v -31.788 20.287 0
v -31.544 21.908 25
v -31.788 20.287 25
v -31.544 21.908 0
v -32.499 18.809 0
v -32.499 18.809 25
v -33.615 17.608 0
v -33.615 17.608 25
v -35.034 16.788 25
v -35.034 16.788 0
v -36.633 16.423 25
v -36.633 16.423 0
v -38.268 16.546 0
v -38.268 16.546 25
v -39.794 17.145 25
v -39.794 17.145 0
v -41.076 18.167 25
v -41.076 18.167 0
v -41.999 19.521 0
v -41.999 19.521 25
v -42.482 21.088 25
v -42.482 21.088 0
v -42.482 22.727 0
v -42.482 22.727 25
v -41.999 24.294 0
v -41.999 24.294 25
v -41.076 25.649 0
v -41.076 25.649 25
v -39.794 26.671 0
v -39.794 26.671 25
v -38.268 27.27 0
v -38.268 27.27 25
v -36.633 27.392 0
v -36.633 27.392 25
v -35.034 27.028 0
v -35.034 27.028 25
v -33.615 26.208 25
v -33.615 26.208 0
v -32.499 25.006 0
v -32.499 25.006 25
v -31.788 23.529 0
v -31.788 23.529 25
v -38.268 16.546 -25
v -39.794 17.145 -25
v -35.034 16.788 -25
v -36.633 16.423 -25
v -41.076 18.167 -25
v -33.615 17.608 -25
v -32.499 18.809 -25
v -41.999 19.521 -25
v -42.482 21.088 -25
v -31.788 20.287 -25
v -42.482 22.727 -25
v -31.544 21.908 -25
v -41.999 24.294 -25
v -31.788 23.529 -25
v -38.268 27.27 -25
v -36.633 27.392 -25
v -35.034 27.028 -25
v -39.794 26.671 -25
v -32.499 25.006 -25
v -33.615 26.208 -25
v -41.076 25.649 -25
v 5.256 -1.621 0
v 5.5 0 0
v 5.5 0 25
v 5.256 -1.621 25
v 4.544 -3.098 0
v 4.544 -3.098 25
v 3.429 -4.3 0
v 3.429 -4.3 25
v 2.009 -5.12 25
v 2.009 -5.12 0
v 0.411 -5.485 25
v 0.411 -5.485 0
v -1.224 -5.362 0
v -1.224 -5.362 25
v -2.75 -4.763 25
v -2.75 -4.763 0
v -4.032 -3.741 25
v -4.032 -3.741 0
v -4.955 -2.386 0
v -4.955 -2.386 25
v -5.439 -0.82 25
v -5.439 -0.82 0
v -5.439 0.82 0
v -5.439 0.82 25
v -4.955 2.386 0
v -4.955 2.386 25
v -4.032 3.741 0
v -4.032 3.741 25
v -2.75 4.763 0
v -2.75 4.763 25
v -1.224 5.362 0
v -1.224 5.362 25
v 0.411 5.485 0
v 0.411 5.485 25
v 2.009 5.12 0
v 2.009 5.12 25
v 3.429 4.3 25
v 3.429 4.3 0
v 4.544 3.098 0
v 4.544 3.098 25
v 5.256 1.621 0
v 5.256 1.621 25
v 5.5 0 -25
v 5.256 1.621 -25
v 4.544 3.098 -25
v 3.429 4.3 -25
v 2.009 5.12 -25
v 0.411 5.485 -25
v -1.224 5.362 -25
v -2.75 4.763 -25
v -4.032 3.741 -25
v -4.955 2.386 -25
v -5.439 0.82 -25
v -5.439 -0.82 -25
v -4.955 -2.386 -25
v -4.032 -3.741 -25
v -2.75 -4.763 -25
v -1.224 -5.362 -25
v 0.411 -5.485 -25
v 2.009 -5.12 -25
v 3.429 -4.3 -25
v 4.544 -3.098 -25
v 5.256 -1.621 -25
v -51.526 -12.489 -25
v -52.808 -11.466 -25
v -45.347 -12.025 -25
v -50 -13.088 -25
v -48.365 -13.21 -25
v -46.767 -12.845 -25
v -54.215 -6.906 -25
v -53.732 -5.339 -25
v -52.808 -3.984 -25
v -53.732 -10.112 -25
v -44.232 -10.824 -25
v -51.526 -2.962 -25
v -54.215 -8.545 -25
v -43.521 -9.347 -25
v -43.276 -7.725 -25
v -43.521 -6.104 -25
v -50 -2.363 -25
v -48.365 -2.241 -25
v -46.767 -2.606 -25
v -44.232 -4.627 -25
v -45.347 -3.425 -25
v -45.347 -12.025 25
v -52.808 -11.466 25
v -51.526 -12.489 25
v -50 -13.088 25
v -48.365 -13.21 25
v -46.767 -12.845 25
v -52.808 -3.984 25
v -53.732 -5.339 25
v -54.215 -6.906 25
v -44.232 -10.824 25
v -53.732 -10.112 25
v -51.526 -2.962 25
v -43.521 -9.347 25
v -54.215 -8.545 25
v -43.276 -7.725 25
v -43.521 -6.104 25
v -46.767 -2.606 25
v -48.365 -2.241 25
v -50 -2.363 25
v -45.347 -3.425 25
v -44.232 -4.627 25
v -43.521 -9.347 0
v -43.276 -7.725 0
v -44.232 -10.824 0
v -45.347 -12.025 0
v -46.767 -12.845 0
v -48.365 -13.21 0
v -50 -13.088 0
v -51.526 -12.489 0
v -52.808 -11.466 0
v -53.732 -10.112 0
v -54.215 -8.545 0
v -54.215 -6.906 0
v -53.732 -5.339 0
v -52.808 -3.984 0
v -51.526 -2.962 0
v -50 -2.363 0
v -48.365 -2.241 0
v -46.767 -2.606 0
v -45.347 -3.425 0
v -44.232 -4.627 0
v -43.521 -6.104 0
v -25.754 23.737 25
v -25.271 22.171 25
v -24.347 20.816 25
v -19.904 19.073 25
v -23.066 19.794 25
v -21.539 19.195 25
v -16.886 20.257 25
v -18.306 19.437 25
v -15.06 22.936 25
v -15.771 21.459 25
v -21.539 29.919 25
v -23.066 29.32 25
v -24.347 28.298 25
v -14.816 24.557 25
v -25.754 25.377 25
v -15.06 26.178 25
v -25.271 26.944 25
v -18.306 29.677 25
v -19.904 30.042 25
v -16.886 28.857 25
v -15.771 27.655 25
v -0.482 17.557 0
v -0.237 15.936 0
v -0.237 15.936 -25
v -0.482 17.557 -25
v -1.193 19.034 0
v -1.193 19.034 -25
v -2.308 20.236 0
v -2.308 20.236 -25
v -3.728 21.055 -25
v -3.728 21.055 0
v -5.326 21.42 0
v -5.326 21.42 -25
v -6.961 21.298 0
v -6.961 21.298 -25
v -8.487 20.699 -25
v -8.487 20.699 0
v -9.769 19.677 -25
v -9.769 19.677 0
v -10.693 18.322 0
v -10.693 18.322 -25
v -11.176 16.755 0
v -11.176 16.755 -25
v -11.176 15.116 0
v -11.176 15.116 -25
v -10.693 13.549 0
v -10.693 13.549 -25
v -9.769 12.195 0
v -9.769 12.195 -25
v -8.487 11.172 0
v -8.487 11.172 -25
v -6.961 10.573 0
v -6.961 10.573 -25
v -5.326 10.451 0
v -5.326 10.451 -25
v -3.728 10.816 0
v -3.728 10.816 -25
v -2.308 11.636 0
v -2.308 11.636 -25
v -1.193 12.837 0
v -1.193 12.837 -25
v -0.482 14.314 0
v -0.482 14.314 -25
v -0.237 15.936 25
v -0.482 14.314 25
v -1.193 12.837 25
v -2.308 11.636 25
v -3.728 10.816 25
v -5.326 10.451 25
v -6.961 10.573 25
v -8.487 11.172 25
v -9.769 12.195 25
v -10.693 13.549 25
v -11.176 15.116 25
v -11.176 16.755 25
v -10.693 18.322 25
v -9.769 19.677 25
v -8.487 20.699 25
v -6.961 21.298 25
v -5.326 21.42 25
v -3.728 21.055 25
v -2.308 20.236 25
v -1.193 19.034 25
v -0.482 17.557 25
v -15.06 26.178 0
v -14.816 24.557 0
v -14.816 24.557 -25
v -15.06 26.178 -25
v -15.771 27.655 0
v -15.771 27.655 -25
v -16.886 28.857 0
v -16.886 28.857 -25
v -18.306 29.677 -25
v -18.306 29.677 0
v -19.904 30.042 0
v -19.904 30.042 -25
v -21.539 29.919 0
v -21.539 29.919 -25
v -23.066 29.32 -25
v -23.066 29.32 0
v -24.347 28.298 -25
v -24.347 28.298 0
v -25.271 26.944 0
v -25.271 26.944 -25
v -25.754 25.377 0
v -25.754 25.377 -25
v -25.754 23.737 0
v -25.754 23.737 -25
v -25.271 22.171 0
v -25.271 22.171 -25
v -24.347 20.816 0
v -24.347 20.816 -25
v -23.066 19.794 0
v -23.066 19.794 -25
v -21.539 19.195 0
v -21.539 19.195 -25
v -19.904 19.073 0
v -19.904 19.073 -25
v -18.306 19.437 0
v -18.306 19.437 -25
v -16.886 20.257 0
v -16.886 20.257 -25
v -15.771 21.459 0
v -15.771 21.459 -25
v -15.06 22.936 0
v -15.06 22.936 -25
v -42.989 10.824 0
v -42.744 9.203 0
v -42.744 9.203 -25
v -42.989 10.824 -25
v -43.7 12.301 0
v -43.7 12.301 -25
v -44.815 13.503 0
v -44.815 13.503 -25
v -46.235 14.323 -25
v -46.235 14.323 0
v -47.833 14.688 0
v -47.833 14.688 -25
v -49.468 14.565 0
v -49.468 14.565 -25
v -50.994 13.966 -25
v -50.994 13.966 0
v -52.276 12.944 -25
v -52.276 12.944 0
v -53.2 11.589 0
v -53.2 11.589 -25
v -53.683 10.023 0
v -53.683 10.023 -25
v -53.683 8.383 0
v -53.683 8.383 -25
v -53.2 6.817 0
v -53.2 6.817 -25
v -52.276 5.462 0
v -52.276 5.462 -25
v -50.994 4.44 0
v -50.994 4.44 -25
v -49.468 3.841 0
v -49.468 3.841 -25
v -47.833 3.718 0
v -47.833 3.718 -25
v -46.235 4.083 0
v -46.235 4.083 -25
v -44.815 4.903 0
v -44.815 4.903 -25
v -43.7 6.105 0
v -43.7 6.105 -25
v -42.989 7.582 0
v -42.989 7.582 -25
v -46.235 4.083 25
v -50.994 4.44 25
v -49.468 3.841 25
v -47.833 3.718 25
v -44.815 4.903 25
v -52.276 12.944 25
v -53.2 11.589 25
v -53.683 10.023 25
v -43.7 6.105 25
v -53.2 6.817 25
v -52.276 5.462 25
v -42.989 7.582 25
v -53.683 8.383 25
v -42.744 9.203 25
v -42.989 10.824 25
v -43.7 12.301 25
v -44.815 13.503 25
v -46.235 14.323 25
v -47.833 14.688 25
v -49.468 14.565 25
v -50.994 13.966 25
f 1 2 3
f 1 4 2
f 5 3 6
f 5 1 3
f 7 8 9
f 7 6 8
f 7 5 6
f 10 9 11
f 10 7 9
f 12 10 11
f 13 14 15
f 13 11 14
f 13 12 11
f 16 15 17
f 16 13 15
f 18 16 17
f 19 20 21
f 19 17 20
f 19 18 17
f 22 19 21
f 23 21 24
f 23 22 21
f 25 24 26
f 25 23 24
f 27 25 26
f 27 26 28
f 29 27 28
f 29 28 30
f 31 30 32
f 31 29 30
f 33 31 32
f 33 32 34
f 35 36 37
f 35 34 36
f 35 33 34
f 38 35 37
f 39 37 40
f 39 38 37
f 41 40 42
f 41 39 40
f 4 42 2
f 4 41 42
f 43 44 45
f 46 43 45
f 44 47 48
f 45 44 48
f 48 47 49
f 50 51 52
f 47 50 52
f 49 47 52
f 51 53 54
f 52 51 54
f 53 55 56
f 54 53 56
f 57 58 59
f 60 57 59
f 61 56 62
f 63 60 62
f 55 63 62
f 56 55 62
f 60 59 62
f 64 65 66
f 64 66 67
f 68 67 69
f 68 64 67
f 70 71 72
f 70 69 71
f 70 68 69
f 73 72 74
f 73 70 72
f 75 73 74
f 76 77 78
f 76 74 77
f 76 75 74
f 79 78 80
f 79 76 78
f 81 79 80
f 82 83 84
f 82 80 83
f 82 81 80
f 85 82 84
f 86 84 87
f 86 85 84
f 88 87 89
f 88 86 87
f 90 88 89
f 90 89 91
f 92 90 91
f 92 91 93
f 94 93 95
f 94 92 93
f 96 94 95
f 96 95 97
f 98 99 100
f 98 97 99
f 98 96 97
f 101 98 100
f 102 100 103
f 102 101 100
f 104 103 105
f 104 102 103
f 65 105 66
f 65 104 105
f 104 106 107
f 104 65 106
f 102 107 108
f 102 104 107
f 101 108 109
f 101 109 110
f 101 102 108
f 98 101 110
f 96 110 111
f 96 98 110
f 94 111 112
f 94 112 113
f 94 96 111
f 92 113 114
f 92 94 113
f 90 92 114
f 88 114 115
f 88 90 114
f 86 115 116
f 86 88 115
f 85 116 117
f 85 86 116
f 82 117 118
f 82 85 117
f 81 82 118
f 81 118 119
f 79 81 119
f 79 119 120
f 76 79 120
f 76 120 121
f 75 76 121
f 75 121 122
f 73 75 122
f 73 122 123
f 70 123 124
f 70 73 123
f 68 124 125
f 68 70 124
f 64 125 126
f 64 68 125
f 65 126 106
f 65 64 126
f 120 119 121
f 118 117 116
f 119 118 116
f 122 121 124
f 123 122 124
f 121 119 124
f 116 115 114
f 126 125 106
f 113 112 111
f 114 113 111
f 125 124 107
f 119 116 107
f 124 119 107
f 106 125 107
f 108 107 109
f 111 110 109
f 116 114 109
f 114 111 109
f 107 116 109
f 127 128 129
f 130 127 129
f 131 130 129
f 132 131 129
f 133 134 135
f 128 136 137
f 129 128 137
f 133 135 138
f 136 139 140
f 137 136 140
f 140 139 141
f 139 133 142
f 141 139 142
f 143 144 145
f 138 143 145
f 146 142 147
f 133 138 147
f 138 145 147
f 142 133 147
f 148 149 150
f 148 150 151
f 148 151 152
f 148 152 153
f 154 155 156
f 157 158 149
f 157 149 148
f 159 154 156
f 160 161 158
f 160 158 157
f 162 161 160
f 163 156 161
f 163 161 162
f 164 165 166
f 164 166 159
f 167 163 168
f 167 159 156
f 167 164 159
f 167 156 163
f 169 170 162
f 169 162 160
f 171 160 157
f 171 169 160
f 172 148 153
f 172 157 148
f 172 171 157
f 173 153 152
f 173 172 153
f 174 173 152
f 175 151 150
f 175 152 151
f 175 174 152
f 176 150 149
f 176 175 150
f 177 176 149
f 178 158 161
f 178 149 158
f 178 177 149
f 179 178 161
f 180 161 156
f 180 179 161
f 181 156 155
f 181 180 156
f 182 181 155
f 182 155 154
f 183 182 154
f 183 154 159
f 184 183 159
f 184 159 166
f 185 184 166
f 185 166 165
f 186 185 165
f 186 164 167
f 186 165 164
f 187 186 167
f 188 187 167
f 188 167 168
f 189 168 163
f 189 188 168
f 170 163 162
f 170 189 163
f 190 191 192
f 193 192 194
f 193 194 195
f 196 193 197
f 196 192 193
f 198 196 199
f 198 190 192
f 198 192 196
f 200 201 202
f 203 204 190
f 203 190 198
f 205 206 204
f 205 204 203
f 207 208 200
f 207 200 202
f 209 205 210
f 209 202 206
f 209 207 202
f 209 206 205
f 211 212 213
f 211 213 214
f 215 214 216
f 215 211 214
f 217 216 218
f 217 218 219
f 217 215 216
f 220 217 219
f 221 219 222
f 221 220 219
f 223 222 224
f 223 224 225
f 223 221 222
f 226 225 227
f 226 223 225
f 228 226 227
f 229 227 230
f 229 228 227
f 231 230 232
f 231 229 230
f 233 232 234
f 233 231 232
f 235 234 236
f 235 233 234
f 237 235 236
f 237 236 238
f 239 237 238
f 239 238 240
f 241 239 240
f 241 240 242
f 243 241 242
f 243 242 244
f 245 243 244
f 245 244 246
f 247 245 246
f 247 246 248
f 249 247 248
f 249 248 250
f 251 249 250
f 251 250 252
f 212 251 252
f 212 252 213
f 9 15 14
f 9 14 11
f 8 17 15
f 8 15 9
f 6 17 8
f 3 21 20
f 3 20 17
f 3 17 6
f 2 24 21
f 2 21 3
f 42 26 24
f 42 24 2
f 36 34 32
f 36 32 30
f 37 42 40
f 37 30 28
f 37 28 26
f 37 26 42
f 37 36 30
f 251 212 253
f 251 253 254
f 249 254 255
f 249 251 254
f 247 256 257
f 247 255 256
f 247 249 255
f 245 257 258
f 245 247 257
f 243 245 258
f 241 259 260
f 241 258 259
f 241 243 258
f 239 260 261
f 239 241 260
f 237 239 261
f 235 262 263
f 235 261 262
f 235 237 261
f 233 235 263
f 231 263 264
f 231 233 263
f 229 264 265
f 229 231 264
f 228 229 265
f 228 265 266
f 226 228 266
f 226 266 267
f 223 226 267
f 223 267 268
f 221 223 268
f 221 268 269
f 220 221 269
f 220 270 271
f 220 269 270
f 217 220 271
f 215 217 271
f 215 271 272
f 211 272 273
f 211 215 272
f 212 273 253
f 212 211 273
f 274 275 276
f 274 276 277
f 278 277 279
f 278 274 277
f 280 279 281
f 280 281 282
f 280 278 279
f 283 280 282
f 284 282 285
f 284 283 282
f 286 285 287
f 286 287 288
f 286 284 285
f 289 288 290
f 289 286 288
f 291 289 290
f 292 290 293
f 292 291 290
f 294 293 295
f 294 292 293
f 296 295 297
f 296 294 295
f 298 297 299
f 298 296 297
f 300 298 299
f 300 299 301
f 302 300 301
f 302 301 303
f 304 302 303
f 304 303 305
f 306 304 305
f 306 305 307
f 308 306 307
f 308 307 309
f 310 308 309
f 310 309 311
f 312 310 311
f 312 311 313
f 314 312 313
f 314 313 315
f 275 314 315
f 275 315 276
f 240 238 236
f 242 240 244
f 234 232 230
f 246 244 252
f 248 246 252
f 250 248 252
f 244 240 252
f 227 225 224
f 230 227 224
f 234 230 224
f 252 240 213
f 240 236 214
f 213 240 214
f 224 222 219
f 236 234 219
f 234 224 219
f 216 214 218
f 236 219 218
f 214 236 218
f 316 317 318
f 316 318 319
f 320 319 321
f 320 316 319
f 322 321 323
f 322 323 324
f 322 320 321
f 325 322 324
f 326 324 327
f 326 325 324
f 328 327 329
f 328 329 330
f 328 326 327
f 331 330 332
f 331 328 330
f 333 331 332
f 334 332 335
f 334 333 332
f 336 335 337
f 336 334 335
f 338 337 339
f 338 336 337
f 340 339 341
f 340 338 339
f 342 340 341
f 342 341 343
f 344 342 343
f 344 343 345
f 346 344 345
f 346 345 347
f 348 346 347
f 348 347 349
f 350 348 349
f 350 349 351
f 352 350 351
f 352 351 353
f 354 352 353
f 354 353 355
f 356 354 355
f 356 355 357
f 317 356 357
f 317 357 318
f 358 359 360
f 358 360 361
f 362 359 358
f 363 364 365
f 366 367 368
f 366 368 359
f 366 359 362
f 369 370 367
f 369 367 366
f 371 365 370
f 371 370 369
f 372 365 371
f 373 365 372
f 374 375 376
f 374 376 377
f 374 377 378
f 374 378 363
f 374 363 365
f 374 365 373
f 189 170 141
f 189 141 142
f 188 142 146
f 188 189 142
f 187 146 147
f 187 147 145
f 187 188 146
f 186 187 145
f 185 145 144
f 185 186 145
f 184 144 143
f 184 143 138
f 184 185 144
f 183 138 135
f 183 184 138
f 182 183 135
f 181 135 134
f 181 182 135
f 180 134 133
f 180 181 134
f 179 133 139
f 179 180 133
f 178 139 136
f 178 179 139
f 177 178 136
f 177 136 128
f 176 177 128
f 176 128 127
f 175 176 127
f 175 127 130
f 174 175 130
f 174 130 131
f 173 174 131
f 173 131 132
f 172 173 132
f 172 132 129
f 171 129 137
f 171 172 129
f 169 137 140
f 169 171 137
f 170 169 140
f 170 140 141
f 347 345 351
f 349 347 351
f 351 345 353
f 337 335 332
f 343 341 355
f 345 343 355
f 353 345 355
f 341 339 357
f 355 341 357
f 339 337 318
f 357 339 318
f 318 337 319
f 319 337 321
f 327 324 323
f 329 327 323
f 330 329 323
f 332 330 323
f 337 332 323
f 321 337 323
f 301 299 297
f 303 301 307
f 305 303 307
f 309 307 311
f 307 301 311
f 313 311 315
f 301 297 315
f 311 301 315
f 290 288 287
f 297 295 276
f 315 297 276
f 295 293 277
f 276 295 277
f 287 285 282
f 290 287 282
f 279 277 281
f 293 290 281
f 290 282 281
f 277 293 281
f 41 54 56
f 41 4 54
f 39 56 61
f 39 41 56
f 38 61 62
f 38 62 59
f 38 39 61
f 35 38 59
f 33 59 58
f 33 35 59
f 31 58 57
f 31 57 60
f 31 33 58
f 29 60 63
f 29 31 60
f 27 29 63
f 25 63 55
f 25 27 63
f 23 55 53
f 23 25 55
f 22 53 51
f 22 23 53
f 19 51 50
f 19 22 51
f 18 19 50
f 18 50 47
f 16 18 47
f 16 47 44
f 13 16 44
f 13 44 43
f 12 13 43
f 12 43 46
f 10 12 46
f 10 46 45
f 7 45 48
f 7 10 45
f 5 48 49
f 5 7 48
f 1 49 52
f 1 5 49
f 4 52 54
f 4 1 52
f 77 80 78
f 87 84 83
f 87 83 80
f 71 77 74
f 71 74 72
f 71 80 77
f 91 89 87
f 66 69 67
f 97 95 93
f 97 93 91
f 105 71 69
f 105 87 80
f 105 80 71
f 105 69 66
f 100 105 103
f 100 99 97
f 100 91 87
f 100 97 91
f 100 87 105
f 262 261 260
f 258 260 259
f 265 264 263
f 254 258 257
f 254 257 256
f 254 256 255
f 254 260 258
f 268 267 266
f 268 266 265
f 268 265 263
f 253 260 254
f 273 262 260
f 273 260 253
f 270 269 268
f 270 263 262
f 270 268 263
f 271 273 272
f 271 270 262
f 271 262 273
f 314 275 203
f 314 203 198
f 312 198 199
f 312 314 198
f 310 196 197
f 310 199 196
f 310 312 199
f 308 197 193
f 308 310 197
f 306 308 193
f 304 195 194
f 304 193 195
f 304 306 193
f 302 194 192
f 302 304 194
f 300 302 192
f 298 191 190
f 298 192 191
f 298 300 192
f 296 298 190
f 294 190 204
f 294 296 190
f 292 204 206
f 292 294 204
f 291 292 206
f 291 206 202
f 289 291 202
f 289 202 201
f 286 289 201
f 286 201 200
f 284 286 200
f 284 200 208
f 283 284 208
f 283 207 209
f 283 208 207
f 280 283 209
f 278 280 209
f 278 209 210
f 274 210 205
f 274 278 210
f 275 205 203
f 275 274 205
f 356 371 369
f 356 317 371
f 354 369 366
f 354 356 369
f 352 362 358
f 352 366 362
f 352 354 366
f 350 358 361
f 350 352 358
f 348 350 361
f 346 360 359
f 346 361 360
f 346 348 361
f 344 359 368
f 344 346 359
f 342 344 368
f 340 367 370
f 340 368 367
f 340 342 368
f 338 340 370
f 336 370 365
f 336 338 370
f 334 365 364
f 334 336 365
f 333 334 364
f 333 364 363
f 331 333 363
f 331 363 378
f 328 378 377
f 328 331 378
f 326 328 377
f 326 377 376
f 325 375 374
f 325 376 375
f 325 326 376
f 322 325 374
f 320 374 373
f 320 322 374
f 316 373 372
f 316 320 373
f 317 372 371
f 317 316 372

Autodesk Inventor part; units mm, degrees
ref_plane "YZ Plane" through (0, 0, 0) normal (1, 0, 0) x (0, 1, 0)
ref_plane "XZ Plane" through (0, 0, 0) normal (0, 1, 0) x (-1, 0, 0)
ref_plane "XY Plane" through (0, 0, 0) normal (0, 0, 1) x (1, 0, 0)
ref_plane "Work Plane1" through (0, 0, 0) normal (0, 0, 1) x (1, 0, 0)
sketch "Sketch1" plane through (0, 0, 0) normal (0, 0, 1) x (1, 0, 0)
  circle A0 centre (-48.7764, -7.7254) radius 5.5 projected
  circle A1 centre (-48.2444, 9.2031) radius 5.5 projected
  circle A2 centre (-37.0438, 21.9077) radius 5.5 projected
  circle A3 centre (-20.3155, 24.5572) radius 5.5 projected
  circle A4 centre (-5.7372, 15.9356) radius 5.5 projected
  circle A5 centre (0, 0) radius 5.5 projected
  arc A6 (-6.9193, 6.5094) -> (1.1822, 9.4262) centre (0, 0) ccw projected
  arc A7 (1.1822, 9.4262) -> (-10.8348, 23.9521) centre (-5.7372, 15.9356) ccw projected
  arc A8 (-10.8348, 23.9521) -> (-29.3531, 27.4847) centre (-20.3155, 24.5572) ccw projected
  arc A9 (-29.3531, 27.4847) -> (-45.8736, 18.4025) centre (-37.0438, 21.9077) ccw projected
  arc A10 (-45.8736, 18.4025) -> (-52.8136, 0.8741) centre (-48.2444, 9.2031) ccw projected
  arc A11 (-52.8136, 0.8741) -> (-44.2073, 0.6036) centre (-48.7764, -7.7254) ccw projected
  arc A12 (-44.2073, 0.6036) -> (-39.4147, 12.7083) centre (-48.2444, 9.2031) ccw projected
  arc A13 (-39.4147, 12.7083) -> (-28.0062, 18.9802) centre (-37.0438, 21.9077) ccw projected
  arc A14 (-28.0062, 18.9802) -> (-15.2179, 16.5407) centre (-20.3155, 24.5572) ccw projected
  arc A15 (-15.2179, 16.5407) -> (-6.9193, 6.5094) centre (-5.7372, 15.9356) ccw projected
  point P0 (0, 0)
extrude "Extrusion1" add sketch "Sketch1" along normal mid plane 50 contours A0 | A1 | A2 | A3 | A4 | A5
properties part number "cut hole in pelvis"
